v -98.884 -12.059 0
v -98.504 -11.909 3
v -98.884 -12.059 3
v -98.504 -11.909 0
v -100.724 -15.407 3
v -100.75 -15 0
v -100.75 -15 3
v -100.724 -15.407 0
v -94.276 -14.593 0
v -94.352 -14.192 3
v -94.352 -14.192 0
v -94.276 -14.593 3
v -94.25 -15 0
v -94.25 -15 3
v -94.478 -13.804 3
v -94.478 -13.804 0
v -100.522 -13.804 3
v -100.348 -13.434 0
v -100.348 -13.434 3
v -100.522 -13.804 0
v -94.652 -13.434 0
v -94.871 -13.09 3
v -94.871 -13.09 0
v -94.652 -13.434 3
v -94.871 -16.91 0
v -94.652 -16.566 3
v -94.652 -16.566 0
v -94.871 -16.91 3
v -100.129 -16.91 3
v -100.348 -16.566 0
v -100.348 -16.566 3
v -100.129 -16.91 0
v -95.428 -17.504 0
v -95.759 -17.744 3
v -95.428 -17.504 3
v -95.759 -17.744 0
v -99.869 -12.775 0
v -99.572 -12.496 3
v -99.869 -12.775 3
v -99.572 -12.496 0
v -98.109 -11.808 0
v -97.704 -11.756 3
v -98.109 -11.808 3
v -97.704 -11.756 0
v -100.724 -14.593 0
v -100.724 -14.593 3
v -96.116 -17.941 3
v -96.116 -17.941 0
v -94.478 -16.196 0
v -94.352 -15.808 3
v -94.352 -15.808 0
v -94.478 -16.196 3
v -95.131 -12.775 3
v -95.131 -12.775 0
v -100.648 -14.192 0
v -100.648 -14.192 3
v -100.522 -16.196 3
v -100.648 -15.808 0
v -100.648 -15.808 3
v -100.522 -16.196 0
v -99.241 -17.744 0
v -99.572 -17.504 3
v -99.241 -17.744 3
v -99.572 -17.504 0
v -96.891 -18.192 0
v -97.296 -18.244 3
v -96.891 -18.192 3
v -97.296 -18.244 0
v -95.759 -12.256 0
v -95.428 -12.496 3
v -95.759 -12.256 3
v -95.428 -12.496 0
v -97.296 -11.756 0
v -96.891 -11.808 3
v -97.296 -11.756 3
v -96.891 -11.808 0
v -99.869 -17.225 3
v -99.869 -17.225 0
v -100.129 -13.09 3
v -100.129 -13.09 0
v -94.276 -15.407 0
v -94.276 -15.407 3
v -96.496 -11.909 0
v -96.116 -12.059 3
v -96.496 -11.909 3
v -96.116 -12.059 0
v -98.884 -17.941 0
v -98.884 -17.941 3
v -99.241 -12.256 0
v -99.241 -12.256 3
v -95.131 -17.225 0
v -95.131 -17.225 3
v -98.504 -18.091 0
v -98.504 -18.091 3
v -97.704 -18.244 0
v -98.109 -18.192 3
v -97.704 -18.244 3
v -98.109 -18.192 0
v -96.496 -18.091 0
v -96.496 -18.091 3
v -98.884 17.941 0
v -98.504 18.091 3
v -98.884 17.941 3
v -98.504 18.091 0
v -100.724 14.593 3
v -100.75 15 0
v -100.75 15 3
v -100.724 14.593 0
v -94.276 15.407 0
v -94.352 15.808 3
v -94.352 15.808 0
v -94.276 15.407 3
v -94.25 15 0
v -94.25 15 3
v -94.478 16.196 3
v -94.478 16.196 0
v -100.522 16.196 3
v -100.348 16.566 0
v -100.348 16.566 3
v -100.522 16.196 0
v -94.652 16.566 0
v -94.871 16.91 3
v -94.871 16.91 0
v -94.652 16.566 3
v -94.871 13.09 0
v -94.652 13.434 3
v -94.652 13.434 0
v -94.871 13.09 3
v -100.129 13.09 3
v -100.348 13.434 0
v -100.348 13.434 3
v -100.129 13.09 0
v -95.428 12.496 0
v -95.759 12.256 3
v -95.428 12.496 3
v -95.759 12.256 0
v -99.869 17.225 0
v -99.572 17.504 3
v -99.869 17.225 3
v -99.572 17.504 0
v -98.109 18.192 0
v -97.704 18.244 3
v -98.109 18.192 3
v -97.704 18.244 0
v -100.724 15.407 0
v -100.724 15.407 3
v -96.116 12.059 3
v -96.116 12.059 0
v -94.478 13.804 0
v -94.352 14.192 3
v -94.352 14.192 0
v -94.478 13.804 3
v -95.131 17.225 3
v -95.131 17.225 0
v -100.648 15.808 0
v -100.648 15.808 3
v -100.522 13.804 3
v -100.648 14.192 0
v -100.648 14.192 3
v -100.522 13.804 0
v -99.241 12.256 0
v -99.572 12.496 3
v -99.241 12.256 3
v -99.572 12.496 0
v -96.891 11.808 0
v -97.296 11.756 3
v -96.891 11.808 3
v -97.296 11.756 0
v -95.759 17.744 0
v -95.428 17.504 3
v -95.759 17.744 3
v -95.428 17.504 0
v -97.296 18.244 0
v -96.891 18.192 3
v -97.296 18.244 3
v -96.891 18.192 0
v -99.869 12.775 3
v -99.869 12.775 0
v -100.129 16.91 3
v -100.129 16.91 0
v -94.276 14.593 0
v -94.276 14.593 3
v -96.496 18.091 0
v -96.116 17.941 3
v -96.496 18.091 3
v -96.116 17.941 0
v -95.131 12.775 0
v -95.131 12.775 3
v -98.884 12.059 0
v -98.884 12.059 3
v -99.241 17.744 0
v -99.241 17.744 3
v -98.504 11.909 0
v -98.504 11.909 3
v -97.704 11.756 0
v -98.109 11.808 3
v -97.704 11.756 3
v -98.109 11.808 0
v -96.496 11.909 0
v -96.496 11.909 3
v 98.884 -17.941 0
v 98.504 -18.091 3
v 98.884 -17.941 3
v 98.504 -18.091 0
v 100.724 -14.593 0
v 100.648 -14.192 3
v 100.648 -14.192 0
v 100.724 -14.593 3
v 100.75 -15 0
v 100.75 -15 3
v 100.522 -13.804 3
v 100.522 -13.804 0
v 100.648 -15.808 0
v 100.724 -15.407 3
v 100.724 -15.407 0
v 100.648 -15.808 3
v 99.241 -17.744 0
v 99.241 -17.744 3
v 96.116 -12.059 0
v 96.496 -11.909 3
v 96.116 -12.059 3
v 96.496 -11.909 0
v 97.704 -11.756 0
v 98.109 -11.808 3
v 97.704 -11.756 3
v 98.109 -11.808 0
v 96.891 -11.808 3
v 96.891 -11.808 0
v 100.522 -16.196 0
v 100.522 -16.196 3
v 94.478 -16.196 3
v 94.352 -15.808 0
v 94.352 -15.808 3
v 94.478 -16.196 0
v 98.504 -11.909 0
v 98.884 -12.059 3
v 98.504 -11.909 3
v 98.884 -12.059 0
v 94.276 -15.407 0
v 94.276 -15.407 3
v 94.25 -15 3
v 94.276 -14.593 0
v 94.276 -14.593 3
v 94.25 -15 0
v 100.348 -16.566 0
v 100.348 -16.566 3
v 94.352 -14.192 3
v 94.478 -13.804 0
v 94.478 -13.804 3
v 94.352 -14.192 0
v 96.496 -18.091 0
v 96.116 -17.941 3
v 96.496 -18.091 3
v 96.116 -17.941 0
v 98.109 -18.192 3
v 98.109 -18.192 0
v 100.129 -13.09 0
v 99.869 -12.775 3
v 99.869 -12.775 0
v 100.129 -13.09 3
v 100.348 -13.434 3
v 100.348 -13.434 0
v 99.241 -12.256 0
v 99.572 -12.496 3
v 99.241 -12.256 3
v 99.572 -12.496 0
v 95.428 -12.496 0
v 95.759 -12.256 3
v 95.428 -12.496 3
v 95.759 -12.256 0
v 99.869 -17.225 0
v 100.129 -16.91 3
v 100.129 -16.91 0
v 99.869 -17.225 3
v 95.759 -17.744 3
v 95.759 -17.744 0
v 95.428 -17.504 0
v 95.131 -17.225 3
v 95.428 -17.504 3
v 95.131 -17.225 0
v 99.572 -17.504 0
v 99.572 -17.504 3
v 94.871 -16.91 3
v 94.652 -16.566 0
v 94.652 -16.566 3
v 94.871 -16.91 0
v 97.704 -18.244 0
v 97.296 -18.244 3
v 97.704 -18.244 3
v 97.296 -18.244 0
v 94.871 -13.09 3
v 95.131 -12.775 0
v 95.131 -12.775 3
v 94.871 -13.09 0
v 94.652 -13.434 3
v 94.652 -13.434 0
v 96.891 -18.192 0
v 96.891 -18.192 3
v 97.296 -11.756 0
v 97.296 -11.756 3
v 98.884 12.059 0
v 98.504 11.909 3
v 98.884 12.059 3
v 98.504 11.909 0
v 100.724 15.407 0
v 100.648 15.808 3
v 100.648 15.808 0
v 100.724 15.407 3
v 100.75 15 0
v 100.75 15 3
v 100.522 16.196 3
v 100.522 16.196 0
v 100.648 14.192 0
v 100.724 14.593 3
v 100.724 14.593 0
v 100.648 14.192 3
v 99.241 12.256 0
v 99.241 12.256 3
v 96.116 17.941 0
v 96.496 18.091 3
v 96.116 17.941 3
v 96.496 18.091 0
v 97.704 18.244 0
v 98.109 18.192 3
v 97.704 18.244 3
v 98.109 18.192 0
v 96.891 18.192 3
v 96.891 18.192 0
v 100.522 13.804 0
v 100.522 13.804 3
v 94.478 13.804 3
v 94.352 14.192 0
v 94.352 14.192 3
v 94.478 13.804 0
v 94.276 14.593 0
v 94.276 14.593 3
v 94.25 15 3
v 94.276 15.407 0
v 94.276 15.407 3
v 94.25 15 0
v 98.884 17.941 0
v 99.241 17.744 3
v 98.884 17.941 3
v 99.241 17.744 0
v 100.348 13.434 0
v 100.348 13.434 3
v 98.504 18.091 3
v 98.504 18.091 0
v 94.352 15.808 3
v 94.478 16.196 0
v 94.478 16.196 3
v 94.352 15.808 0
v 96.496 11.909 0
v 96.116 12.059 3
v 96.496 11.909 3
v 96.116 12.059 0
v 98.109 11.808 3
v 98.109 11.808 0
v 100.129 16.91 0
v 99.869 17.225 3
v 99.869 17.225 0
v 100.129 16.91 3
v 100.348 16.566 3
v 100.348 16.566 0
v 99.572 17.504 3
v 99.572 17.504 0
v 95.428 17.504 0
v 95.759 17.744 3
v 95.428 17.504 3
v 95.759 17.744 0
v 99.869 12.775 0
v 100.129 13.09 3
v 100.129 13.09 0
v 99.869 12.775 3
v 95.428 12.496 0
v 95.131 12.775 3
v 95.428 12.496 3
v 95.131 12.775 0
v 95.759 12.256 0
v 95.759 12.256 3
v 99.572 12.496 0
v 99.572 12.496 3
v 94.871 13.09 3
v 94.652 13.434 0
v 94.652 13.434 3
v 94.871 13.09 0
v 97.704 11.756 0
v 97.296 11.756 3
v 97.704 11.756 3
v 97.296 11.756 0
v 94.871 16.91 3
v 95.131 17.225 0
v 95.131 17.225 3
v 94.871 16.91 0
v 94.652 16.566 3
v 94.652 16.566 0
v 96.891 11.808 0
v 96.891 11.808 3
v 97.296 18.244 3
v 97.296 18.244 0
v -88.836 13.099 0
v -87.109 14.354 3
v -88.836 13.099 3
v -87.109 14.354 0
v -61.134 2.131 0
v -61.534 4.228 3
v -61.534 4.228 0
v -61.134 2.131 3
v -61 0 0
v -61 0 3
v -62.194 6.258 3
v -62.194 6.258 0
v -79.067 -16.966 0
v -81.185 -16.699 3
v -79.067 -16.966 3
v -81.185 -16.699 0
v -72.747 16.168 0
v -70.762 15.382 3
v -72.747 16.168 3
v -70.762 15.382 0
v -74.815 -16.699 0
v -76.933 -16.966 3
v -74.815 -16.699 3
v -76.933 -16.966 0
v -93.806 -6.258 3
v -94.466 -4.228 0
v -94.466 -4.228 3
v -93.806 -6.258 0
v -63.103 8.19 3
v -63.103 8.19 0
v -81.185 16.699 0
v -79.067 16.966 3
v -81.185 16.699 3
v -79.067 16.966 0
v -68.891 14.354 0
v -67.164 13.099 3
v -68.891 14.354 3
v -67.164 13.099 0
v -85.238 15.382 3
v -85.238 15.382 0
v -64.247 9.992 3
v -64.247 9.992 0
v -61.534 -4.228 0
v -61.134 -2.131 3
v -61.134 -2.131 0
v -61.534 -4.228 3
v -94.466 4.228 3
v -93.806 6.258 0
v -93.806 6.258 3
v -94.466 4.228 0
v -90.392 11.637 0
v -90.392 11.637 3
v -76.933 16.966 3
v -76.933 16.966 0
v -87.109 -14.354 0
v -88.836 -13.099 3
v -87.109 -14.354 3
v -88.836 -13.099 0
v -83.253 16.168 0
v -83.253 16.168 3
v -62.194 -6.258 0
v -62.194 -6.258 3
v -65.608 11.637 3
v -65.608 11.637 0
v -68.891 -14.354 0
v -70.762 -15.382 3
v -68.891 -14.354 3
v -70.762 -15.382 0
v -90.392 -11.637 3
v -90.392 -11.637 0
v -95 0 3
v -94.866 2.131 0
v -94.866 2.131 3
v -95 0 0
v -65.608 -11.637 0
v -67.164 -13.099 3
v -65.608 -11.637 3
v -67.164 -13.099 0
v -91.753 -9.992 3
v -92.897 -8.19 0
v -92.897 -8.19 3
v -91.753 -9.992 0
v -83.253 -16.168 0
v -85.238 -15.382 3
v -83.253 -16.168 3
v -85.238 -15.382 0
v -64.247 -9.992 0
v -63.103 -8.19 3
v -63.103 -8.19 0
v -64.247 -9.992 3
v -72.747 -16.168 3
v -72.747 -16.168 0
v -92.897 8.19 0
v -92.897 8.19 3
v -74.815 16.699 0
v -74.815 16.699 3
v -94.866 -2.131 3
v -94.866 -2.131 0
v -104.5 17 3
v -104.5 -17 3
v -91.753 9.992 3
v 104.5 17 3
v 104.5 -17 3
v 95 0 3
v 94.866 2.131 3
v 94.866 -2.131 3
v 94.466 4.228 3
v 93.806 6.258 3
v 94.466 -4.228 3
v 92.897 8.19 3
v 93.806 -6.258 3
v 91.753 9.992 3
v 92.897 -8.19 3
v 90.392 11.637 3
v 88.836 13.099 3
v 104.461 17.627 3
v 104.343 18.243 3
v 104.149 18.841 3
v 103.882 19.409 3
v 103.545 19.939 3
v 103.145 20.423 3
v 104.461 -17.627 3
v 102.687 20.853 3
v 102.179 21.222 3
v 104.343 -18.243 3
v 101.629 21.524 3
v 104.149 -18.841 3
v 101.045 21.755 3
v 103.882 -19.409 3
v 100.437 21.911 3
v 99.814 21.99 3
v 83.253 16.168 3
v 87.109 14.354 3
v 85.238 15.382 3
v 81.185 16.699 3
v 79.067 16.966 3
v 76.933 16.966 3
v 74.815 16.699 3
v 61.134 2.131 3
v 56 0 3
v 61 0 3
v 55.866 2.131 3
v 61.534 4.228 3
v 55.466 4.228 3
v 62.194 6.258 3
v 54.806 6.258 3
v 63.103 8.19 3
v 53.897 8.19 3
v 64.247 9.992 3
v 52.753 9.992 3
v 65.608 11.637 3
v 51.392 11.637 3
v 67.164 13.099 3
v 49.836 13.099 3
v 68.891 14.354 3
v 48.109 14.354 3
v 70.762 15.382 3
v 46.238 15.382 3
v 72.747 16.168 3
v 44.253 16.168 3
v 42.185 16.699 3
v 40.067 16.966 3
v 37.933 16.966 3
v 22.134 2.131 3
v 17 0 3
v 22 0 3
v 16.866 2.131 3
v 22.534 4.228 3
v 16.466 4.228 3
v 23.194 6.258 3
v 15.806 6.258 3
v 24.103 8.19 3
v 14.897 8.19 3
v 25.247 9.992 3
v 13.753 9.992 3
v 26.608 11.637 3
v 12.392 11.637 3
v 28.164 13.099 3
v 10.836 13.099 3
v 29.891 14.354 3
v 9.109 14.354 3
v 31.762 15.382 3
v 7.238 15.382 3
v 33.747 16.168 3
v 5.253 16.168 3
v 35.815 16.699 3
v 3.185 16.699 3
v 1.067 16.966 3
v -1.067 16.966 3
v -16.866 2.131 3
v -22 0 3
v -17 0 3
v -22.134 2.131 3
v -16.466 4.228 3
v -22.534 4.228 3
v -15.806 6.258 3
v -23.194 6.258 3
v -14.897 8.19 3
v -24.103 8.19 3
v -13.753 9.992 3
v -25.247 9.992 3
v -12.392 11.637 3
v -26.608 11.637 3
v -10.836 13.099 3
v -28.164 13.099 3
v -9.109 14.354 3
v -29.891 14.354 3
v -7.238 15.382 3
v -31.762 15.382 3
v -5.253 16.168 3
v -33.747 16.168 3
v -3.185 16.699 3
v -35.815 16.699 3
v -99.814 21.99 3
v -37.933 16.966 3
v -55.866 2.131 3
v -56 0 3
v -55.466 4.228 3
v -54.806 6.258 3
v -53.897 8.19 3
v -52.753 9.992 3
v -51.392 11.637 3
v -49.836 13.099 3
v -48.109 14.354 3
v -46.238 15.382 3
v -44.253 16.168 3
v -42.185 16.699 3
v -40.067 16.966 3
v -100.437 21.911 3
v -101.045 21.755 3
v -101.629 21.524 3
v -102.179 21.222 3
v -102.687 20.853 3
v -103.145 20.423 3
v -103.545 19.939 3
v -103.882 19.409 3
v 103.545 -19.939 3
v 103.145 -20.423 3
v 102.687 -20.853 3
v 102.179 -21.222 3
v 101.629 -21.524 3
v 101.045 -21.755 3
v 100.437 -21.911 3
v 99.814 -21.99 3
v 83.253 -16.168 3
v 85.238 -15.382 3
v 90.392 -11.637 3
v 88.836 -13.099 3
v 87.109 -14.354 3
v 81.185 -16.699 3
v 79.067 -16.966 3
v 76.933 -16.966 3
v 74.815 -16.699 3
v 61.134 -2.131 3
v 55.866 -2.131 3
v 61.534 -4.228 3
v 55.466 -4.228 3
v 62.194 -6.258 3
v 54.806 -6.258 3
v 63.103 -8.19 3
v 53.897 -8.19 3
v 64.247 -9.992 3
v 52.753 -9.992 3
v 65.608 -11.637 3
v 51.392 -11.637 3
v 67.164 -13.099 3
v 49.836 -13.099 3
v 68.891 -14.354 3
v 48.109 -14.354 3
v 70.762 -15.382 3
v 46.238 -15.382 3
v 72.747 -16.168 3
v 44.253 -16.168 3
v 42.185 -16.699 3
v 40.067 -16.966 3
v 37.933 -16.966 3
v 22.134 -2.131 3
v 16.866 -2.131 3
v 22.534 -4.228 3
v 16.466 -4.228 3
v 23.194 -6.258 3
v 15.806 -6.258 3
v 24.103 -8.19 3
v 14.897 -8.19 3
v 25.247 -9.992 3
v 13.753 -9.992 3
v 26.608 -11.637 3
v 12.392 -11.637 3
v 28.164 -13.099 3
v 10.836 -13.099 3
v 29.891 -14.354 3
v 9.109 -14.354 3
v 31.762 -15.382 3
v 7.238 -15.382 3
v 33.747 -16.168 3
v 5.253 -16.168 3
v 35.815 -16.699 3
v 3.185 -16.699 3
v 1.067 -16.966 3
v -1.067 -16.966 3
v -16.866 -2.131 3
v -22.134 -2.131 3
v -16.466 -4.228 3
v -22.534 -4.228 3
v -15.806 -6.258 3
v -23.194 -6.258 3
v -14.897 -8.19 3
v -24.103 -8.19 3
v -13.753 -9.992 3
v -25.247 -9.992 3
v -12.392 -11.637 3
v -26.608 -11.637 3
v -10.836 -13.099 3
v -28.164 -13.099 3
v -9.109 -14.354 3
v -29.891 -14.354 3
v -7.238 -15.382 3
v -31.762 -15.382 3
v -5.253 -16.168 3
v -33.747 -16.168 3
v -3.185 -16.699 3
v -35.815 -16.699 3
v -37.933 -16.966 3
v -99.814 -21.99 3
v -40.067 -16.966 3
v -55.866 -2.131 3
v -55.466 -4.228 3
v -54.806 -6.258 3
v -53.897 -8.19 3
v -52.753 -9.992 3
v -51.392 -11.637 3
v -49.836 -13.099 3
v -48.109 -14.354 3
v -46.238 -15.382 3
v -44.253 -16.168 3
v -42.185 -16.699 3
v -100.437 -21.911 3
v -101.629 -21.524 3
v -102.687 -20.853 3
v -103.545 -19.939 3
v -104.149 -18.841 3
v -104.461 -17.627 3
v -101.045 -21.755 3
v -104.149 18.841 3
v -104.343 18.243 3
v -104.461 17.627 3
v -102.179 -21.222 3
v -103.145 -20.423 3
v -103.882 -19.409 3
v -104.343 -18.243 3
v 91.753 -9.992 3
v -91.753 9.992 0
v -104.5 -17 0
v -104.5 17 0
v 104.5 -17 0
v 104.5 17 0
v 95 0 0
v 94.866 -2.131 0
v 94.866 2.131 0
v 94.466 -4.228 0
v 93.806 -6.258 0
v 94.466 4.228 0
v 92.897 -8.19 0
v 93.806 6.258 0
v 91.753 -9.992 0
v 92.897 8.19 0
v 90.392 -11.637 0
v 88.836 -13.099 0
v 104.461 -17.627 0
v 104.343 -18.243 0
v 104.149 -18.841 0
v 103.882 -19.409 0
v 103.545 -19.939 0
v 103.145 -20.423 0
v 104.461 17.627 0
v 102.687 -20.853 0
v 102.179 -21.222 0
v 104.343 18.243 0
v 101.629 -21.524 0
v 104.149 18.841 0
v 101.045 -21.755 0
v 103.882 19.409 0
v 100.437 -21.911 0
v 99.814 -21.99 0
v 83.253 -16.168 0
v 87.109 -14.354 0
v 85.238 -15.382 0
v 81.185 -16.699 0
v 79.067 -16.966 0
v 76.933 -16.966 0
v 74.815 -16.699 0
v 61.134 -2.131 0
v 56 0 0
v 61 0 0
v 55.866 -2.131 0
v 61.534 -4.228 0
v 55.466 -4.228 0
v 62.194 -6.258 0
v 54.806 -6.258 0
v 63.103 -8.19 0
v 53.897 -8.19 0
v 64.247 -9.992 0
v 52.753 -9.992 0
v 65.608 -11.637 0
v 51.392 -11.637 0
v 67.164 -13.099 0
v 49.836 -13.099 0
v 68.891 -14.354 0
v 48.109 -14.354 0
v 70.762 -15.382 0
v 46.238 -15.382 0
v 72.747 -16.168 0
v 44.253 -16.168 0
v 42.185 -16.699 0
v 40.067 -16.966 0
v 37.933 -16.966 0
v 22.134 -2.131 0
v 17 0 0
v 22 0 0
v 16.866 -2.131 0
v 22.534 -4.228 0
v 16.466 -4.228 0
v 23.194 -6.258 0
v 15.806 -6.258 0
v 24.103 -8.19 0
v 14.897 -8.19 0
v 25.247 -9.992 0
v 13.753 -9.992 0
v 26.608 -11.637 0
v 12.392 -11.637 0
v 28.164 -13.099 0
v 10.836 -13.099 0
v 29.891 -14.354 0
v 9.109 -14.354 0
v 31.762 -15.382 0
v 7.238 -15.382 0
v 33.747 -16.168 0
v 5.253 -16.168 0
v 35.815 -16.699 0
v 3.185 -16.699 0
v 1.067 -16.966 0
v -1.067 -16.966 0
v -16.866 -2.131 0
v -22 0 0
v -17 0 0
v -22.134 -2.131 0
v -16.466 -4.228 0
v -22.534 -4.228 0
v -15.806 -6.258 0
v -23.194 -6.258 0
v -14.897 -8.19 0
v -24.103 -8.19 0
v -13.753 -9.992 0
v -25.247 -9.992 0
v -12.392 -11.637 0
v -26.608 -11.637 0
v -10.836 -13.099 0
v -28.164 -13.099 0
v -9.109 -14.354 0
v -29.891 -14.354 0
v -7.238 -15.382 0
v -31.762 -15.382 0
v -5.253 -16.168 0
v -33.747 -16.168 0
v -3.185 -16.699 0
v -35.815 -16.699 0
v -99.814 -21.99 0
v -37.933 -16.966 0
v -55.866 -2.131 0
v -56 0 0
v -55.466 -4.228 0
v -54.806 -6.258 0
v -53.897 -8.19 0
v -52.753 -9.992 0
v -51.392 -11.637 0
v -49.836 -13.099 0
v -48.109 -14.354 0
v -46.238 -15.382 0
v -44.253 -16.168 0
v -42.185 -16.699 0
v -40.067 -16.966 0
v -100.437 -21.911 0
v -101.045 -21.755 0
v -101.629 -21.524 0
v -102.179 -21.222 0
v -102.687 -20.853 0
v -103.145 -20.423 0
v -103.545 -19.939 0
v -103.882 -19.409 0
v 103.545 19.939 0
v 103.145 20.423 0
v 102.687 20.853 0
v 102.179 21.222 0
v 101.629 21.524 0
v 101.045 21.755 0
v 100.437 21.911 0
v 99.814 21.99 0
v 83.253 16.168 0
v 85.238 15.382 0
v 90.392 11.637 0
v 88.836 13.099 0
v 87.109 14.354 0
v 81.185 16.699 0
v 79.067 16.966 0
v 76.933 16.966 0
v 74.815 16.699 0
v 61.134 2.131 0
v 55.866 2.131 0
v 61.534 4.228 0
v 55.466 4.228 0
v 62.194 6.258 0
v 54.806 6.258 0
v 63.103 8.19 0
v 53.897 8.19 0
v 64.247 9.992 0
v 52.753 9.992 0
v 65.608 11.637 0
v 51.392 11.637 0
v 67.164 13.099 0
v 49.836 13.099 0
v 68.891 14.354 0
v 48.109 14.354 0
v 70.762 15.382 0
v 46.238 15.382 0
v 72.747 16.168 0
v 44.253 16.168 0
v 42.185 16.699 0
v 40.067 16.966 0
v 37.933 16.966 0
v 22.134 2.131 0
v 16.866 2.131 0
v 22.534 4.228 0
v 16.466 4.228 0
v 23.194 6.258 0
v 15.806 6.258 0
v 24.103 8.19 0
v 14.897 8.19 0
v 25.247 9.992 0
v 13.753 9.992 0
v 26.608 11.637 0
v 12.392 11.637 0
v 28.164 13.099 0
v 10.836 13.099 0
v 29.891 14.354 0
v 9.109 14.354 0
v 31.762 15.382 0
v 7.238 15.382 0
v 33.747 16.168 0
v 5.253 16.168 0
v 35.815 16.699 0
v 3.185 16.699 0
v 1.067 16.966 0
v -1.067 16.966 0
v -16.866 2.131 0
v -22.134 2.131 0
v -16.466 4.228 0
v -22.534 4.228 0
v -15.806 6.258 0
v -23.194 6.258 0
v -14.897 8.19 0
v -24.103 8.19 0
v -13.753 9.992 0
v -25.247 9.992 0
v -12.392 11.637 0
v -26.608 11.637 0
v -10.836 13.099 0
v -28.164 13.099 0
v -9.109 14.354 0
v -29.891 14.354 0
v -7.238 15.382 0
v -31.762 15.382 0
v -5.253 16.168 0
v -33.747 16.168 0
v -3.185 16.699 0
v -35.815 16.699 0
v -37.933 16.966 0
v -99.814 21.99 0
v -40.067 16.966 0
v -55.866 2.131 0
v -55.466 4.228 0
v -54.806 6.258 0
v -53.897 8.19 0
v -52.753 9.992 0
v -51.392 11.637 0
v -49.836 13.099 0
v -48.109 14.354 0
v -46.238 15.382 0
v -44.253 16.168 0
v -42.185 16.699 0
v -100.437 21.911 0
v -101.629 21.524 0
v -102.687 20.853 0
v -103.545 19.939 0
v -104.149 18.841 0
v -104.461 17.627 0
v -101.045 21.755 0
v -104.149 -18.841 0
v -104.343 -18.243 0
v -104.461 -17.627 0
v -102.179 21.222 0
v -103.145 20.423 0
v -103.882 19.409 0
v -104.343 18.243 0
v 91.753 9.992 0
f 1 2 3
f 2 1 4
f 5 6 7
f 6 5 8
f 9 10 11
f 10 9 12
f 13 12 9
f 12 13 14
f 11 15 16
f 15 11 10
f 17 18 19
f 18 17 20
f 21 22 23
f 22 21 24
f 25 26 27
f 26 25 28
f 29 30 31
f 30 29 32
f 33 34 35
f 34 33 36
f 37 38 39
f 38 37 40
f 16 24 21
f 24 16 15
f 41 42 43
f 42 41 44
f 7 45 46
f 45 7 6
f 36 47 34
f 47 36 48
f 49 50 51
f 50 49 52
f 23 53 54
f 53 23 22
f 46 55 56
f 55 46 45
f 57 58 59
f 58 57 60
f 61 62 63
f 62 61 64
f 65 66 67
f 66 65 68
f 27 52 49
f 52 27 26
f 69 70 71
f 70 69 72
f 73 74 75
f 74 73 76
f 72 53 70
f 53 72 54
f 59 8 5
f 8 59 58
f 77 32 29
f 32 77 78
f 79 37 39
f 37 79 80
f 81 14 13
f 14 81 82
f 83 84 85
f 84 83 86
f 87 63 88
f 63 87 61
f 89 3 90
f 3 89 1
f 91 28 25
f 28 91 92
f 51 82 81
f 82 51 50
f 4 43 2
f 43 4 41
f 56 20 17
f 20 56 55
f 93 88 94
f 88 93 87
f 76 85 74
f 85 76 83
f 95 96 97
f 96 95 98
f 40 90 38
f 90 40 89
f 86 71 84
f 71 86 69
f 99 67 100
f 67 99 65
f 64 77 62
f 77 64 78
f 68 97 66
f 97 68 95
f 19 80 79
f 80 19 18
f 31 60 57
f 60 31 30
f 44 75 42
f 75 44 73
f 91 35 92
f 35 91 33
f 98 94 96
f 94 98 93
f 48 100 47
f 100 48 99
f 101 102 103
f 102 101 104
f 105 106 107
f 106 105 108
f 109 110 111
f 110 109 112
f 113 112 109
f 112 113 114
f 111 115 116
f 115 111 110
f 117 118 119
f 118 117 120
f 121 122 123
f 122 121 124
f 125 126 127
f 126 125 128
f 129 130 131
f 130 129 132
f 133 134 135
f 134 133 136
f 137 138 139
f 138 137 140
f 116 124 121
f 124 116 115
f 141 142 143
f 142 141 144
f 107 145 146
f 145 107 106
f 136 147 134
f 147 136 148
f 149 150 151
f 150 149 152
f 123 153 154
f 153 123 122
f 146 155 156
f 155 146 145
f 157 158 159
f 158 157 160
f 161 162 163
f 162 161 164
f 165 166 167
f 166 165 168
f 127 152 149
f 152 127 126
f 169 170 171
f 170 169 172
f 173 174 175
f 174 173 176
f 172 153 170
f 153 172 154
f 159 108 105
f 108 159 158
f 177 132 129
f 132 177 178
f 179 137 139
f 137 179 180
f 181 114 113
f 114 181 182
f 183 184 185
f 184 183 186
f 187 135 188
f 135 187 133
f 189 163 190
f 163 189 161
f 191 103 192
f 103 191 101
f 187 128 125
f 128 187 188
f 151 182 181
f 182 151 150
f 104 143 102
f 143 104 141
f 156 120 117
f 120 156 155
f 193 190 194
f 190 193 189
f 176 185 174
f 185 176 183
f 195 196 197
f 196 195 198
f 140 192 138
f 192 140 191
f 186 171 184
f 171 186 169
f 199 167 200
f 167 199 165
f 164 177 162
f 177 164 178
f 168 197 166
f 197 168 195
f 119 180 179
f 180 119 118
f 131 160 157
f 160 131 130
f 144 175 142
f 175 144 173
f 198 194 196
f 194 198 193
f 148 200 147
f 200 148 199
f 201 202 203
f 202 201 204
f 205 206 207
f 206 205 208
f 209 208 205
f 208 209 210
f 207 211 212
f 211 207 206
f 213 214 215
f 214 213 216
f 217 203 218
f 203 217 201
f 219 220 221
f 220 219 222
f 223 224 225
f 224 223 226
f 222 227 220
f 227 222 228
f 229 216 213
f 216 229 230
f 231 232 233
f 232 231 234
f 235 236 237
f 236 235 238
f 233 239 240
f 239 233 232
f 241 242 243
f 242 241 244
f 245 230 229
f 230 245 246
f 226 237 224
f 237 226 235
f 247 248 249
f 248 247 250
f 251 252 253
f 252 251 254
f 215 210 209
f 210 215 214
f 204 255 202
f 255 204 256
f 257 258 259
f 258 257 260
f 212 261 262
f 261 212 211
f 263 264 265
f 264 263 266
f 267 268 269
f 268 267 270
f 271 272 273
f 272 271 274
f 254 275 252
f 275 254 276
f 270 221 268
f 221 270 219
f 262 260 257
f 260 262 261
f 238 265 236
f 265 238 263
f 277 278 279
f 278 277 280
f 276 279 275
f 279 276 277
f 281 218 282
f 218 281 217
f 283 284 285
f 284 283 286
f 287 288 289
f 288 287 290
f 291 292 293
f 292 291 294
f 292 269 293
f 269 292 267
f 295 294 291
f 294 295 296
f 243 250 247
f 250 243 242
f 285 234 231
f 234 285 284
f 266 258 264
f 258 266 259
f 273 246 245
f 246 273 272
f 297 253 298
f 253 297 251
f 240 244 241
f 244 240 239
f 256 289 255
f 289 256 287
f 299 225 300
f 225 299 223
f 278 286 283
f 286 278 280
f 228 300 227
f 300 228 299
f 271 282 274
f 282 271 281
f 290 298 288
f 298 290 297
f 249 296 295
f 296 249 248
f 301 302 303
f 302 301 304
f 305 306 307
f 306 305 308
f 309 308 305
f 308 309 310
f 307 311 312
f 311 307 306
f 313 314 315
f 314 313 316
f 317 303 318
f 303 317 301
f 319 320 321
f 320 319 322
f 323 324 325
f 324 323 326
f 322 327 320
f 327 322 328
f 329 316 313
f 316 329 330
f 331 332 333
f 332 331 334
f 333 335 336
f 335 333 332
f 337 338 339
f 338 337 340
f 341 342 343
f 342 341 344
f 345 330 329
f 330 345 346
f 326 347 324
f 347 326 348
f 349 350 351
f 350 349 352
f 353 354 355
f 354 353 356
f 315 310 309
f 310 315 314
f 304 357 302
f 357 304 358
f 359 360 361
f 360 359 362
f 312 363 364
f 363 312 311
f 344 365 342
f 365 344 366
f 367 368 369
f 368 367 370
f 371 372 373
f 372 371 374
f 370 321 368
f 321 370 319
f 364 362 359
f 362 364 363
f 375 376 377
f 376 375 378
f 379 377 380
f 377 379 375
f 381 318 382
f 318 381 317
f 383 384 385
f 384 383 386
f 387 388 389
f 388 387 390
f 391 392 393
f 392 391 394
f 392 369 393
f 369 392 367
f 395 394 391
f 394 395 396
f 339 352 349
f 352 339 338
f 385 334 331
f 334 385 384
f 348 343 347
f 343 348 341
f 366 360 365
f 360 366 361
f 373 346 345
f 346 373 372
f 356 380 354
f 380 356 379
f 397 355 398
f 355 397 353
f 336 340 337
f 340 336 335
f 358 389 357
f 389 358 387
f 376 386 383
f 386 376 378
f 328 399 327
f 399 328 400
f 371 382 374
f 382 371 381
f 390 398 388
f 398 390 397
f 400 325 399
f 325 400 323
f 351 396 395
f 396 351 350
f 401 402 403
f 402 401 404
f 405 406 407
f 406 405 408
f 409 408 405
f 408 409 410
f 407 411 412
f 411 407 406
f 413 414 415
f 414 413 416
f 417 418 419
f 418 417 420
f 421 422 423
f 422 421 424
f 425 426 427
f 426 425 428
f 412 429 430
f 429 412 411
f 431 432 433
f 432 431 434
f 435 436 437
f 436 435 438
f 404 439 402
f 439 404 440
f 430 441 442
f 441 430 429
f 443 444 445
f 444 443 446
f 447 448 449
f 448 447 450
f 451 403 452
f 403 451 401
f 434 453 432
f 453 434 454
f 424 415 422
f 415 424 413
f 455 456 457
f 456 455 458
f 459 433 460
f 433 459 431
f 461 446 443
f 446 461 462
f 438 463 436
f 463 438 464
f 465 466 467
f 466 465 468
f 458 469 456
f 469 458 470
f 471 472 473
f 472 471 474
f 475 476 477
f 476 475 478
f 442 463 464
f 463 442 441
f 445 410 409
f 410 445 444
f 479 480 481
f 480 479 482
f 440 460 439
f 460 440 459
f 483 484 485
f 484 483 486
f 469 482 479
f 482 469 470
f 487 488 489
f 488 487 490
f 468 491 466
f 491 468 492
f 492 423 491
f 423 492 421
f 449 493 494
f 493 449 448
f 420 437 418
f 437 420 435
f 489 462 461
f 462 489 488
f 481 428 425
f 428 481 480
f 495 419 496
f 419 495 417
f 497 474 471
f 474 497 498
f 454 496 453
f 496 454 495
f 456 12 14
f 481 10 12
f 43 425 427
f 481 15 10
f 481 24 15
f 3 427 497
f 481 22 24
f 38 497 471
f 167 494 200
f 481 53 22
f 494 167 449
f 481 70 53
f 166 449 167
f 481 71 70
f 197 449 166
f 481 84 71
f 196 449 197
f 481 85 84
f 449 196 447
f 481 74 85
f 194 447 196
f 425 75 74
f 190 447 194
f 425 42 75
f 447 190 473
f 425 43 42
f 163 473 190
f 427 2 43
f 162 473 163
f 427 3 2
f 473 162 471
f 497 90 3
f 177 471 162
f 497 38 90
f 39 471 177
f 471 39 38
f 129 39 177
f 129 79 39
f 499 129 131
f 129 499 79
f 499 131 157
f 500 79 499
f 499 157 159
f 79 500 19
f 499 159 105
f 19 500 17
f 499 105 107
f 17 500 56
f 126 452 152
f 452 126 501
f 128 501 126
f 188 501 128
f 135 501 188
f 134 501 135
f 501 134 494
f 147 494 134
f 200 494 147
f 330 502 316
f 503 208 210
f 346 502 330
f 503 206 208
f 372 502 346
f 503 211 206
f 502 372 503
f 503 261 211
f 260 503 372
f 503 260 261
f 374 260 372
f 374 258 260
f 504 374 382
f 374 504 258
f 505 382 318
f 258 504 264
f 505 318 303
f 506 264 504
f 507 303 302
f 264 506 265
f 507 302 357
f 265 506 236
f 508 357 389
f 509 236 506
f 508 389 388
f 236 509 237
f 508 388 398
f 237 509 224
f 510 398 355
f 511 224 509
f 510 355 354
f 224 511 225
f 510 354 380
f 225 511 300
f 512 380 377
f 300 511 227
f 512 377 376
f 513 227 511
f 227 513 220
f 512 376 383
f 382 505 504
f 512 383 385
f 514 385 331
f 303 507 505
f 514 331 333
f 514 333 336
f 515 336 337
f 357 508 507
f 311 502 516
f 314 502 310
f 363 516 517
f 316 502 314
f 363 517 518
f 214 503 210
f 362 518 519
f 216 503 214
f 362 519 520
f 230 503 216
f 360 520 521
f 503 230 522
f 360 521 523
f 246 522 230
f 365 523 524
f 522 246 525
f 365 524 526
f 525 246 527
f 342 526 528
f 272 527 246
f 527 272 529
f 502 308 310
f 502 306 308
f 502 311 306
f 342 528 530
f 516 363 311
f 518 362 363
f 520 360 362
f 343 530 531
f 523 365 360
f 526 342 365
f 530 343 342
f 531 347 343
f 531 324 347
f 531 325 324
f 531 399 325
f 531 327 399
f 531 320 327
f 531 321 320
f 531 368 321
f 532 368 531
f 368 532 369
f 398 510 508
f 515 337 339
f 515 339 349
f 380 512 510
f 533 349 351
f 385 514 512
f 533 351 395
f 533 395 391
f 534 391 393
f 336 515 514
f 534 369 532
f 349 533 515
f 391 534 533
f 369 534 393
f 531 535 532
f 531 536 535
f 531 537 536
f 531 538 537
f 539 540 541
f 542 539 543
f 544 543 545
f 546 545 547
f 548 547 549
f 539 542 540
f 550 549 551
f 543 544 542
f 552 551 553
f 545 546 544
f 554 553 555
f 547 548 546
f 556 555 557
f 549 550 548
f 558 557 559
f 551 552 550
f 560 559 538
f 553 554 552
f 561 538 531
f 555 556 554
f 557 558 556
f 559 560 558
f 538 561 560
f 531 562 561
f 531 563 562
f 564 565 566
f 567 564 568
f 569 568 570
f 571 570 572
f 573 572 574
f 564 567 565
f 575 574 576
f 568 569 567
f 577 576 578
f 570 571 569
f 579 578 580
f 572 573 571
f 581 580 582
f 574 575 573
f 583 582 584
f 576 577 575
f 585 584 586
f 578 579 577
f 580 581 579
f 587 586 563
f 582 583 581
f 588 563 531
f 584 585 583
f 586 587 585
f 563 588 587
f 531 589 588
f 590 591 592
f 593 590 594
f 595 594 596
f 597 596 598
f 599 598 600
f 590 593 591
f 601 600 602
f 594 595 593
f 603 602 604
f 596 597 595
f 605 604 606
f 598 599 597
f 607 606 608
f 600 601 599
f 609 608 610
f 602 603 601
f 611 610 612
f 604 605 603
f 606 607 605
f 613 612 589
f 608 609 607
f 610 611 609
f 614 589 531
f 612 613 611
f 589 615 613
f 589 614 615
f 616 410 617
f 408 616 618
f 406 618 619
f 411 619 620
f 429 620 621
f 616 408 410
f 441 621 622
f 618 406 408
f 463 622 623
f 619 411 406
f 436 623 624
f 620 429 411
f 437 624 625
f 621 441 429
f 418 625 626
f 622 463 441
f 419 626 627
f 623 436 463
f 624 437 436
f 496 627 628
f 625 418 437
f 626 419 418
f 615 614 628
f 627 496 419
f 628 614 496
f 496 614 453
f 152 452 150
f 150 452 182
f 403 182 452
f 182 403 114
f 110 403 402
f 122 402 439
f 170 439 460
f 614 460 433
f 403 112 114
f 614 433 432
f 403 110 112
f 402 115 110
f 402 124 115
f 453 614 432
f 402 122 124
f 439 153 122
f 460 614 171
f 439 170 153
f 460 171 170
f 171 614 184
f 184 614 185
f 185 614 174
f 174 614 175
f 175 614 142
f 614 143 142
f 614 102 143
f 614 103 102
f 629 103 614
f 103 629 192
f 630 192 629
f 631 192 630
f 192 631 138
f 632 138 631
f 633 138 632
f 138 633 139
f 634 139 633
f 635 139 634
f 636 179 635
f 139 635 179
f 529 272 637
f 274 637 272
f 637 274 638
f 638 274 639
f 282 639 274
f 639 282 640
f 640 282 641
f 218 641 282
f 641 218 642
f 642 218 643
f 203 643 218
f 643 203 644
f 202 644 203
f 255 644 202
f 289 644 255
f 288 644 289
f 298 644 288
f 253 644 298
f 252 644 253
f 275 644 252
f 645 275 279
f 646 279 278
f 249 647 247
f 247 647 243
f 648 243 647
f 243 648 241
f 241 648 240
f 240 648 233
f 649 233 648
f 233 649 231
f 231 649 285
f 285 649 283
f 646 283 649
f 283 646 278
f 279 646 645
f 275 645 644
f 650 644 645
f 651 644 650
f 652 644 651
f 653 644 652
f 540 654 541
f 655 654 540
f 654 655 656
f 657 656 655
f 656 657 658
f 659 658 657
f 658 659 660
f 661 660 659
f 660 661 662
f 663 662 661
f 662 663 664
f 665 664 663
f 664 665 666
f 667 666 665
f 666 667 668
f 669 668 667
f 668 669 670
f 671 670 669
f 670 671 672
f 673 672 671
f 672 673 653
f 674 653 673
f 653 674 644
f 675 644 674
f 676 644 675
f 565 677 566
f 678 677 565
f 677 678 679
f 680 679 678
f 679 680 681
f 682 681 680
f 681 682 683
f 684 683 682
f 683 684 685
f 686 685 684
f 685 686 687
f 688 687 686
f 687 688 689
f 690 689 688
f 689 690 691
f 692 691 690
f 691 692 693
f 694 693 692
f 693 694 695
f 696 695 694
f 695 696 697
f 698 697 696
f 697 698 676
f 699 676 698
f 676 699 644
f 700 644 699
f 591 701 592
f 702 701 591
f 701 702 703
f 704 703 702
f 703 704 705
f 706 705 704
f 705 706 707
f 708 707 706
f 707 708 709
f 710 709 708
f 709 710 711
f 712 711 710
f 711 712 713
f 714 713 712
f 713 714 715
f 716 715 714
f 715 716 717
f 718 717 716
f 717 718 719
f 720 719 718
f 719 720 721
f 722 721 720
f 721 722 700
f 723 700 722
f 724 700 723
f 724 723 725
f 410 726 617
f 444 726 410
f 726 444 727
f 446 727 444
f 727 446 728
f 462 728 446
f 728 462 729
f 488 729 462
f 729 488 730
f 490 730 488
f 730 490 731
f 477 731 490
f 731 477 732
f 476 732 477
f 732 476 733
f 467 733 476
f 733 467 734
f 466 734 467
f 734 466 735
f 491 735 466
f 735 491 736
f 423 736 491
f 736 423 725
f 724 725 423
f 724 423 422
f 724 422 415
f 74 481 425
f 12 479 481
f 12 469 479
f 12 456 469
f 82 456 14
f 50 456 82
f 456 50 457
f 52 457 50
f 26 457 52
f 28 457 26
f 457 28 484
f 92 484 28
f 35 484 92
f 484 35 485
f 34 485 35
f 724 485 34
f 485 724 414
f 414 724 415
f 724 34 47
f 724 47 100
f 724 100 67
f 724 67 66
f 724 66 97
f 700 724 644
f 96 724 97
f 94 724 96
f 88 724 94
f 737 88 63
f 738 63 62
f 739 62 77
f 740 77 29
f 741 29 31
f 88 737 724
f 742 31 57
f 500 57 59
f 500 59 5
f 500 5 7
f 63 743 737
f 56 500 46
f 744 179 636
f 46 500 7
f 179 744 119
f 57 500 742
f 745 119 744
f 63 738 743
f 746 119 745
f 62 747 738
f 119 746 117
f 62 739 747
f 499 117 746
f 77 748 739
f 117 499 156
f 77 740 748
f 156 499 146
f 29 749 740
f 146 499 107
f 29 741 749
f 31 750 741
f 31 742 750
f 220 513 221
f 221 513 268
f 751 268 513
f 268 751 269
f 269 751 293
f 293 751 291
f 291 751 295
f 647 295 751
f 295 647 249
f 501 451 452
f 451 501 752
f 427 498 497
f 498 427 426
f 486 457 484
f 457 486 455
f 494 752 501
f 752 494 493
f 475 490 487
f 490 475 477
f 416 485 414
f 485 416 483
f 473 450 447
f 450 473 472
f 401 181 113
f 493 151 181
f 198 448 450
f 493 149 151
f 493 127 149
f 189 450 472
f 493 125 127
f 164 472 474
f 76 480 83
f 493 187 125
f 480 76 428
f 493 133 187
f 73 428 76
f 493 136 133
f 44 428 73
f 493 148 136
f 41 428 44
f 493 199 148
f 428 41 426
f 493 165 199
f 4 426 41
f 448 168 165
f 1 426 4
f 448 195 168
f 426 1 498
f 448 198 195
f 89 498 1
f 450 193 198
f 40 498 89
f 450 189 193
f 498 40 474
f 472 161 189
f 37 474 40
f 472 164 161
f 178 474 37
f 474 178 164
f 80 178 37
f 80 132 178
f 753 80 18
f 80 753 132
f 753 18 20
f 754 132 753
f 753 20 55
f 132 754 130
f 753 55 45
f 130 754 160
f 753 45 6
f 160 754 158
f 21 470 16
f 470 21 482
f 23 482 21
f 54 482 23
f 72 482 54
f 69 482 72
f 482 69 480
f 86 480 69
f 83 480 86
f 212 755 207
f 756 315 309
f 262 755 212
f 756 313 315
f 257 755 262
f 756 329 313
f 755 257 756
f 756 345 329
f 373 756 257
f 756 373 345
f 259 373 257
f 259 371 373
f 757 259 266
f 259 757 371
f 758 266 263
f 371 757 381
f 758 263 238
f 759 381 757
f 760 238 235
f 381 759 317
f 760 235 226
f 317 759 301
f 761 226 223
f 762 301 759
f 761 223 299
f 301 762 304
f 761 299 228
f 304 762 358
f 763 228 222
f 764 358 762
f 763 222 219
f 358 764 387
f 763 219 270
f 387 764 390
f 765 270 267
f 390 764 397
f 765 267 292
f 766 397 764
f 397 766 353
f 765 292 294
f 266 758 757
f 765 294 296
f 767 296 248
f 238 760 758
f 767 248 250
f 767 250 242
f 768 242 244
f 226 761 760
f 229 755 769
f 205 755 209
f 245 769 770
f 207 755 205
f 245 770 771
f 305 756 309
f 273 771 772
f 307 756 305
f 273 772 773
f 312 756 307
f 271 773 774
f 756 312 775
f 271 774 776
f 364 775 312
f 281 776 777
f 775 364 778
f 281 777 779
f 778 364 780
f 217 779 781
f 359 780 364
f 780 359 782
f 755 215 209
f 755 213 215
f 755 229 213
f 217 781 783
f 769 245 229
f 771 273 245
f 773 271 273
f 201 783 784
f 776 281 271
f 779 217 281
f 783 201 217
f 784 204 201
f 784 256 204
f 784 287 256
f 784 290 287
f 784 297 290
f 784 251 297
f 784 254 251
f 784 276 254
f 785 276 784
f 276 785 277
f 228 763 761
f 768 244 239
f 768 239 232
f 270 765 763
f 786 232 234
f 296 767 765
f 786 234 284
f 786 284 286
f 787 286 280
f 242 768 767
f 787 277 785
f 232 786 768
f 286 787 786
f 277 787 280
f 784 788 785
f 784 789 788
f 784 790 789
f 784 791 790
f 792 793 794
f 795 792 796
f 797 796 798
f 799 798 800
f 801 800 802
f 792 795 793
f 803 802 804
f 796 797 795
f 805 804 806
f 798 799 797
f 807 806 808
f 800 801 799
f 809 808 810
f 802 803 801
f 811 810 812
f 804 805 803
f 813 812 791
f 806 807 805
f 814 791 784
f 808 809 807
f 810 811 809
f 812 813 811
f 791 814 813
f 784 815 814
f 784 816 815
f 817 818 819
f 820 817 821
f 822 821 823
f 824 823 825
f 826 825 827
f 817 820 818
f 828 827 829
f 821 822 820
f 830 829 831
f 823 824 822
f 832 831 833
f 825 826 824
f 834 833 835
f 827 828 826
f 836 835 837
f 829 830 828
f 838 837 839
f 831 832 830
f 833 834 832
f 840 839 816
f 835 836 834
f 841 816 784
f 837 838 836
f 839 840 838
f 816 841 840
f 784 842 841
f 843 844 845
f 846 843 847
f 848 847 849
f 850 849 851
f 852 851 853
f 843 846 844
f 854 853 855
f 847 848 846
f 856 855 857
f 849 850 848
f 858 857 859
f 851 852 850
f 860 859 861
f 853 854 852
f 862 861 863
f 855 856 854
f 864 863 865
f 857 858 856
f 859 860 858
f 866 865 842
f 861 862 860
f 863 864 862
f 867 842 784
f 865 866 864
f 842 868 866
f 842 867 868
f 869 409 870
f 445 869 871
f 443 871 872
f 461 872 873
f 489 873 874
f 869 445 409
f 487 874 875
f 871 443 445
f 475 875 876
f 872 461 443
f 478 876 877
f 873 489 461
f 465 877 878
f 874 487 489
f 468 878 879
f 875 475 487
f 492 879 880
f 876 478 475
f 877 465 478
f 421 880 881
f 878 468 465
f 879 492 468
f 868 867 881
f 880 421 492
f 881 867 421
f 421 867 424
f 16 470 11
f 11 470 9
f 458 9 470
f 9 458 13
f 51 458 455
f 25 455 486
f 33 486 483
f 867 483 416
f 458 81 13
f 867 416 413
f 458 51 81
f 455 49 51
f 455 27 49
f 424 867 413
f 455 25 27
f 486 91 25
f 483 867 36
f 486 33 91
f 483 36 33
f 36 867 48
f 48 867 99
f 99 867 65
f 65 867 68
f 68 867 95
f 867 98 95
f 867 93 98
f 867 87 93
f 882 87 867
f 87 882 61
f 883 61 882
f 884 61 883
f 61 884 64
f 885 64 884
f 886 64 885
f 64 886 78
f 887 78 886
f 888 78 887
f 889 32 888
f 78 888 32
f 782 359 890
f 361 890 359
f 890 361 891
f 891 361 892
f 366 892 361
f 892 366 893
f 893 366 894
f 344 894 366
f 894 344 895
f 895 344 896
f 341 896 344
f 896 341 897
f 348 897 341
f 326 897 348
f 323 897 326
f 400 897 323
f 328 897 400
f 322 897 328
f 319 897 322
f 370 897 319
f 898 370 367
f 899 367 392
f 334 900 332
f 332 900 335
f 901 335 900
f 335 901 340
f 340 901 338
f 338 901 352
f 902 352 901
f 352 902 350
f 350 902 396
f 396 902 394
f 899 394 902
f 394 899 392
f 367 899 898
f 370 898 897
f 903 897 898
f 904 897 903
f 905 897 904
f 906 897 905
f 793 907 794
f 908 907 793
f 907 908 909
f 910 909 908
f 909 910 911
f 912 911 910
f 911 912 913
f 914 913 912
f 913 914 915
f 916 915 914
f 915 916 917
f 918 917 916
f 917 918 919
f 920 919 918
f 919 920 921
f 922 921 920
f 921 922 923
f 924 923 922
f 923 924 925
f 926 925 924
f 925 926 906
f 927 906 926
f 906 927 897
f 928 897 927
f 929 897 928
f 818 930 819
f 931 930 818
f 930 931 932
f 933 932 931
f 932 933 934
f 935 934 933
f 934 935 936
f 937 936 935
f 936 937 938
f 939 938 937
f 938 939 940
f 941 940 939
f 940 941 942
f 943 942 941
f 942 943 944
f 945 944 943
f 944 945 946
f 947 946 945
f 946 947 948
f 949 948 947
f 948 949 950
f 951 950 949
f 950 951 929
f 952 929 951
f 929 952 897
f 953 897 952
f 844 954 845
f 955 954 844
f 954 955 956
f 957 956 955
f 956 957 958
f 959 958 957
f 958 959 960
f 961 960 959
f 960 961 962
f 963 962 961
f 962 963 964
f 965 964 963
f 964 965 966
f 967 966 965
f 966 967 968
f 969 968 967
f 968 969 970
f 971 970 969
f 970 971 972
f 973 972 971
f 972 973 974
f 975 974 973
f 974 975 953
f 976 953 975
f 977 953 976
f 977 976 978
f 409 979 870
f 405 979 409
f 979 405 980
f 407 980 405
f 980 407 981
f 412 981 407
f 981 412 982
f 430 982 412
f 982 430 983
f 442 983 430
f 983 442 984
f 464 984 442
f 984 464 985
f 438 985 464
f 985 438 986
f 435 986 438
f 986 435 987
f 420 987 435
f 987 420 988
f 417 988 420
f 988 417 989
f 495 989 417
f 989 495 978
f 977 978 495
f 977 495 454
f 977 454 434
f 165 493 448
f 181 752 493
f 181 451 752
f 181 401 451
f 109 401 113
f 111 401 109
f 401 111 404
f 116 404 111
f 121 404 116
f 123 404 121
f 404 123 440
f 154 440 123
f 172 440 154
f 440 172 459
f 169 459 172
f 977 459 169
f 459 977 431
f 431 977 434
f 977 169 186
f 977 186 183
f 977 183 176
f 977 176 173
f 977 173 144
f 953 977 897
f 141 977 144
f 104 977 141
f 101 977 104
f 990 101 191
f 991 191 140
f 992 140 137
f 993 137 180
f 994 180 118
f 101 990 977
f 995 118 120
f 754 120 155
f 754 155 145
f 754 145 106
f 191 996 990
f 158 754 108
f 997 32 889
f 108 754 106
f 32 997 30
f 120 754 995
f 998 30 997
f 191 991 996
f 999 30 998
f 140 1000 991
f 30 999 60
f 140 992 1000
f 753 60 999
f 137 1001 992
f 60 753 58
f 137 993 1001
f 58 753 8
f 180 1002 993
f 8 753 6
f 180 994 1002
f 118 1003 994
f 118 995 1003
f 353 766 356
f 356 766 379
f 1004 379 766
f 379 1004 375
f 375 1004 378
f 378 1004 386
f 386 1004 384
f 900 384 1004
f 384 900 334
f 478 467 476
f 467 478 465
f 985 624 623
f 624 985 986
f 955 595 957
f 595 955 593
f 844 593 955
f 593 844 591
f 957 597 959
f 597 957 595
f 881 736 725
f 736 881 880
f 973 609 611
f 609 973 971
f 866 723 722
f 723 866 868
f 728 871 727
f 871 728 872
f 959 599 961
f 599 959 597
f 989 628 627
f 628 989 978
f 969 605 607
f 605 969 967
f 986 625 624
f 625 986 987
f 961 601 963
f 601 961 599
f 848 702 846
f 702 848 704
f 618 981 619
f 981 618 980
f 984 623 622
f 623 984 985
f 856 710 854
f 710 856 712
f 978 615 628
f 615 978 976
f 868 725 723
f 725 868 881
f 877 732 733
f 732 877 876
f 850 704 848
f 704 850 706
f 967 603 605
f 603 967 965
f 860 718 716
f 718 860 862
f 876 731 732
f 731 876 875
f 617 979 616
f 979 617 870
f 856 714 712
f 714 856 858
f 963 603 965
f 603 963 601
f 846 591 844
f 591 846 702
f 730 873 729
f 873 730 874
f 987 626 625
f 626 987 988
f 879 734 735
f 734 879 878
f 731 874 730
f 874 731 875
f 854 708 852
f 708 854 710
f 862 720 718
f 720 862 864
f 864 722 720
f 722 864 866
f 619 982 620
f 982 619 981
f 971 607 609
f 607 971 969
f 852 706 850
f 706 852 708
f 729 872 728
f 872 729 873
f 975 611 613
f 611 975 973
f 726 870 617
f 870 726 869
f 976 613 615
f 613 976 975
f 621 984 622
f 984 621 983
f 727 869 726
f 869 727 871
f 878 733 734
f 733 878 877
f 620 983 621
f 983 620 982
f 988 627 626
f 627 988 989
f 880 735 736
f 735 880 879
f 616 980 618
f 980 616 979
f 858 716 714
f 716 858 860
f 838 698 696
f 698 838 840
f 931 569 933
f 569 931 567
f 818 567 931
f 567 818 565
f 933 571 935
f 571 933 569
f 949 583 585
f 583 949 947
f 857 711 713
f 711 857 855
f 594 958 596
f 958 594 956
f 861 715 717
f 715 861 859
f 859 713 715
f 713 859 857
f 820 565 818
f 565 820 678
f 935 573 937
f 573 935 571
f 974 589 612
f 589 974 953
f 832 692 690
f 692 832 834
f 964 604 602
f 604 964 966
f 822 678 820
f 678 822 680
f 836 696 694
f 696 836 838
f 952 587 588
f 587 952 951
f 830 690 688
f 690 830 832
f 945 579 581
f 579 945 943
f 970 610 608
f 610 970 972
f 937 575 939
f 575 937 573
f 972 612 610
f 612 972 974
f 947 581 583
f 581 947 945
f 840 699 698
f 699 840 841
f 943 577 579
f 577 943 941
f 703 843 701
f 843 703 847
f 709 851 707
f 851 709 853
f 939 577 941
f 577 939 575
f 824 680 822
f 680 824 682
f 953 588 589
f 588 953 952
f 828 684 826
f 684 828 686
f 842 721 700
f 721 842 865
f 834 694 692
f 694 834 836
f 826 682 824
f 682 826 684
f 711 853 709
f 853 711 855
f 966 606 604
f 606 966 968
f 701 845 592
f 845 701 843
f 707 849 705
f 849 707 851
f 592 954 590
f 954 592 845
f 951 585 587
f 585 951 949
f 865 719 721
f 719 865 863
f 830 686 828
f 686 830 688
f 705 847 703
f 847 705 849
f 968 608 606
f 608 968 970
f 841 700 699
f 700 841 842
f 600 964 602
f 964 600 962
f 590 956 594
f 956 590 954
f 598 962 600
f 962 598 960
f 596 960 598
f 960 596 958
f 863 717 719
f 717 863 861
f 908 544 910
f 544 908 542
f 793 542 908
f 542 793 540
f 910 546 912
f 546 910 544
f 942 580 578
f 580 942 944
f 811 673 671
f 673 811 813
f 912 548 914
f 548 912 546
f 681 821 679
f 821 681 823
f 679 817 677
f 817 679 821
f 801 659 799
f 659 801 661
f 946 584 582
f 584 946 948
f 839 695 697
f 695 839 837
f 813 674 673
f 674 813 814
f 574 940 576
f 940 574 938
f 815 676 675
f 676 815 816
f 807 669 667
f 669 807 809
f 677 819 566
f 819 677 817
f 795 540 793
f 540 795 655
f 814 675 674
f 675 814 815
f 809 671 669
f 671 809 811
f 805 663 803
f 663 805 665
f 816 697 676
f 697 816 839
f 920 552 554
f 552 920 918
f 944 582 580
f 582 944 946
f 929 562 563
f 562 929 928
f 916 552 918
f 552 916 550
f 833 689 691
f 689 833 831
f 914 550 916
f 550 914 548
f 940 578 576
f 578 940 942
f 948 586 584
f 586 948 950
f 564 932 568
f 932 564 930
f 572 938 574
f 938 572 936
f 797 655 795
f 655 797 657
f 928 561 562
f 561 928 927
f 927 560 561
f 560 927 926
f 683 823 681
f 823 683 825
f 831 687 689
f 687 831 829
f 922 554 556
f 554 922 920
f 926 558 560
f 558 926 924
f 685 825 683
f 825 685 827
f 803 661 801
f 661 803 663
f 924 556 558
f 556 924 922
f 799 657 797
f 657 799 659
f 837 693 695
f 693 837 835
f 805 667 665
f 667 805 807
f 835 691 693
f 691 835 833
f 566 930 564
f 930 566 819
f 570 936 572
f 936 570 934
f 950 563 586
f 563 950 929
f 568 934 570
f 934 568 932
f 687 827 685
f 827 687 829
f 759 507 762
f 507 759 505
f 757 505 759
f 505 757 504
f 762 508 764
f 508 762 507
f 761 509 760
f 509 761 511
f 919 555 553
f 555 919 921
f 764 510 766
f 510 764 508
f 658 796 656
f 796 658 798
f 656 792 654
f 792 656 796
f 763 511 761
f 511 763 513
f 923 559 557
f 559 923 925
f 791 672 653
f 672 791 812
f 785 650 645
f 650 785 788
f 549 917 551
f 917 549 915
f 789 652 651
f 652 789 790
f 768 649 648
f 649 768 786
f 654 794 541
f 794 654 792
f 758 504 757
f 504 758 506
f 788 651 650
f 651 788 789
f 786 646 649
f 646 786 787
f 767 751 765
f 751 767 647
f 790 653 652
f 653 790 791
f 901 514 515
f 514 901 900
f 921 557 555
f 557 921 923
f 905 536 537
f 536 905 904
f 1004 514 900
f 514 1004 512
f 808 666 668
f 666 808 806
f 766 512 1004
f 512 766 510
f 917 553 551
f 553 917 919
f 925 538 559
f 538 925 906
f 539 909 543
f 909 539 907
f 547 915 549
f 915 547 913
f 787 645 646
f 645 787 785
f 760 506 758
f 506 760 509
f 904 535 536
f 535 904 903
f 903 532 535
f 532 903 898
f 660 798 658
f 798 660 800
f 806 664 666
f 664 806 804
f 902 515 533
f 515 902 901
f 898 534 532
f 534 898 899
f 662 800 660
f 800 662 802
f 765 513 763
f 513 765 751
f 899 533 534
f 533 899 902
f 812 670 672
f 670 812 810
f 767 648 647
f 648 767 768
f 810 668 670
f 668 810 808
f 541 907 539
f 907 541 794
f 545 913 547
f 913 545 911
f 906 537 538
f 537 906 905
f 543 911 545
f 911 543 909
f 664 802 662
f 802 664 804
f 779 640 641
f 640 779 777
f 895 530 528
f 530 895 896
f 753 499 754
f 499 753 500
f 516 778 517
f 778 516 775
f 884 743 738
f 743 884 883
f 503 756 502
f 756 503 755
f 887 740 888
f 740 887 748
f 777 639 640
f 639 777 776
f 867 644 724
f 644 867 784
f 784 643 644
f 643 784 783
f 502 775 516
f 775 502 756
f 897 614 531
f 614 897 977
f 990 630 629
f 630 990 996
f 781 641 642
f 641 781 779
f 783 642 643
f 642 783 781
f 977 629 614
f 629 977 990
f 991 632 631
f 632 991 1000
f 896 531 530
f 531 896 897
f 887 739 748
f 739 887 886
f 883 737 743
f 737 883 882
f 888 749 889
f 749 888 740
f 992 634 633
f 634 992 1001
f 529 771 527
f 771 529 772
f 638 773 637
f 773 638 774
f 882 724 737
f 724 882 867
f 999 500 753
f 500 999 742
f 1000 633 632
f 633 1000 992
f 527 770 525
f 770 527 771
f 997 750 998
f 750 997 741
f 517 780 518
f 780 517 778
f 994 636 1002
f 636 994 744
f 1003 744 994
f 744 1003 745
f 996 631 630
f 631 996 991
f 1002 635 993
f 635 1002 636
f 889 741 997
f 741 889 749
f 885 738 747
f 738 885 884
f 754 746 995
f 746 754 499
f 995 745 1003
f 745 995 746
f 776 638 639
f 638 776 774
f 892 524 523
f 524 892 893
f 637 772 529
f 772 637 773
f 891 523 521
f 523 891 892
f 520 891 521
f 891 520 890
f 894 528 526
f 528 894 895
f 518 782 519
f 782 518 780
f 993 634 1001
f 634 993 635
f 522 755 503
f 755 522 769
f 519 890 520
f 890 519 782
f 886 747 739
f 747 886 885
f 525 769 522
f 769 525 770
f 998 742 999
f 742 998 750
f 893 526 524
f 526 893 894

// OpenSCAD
$fn = 50;

difference() {
	union() {
		hull() {
			translate(v = [-99.5, 17.0, 0]) {
				cylinder(h = 3, r = 5);
			}
			translate(v = [99.5, 17.0, 0]) {
				cylinder(h = 3, r = 5);
			}
			translate(v = [-99.5, -17.0, 0]) {
				cylinder(h = 3, r = 5);
			}
			translate(v = [99.5, -17.0, 0]) {
				cylinder(h = 3, r = 5);
			}
		}
	}
	union() {
		translate(v = [-97.5, -15.0, -100.0]) {
			cylinder(h = 200, r = 3.25);
		}
		translate(v = [-97.5, 15.0, -100.0]) {
			cylinder(h = 200, r = 3.25);
		}
		translate(v = [97.5, -15.0, -100.0]) {
			cylinder(h = 200, r = 3.25);
		}
		translate(v = [97.5, 15.0, -100.0]) {
			cylinder(h = 200, r = 3.25);
		}
		translate(v = [-97.5, -15.0, -100.0]) {
			cylinder(h = 200, r = 1.8);
		}
		translate(v = [-97.5, 15.0, -100.0]) {
			cylinder(h = 200, r = 1.8);
		}
		translate(v = [97.5, -15.0, -100.0]) {
			cylinder(h = 200, r = 1.8);
		}
		translate(v = [97.5, 15.0, -100.0]) {
			cylinder(h = 200, r = 1.8);
		}
		translate(v = [-78.0, 0, 0.0]) {
			cylinder(h = 3, r = 17.0);
		}
		translate(v = [-39.0, 0, 0.0]) {
			cylinder(h = 3, r = 17.0);
		}
		cylinder(h = 3, r = 17.0);
		translate(v = [39.0, 0, 0.0]) {
			cylinder(h = 3, r = 17.0);
		}
		translate(v = [78.0, 0, 0.0]) {
			cylinder(h = 3, r = 17.0);
		}
	}
}
